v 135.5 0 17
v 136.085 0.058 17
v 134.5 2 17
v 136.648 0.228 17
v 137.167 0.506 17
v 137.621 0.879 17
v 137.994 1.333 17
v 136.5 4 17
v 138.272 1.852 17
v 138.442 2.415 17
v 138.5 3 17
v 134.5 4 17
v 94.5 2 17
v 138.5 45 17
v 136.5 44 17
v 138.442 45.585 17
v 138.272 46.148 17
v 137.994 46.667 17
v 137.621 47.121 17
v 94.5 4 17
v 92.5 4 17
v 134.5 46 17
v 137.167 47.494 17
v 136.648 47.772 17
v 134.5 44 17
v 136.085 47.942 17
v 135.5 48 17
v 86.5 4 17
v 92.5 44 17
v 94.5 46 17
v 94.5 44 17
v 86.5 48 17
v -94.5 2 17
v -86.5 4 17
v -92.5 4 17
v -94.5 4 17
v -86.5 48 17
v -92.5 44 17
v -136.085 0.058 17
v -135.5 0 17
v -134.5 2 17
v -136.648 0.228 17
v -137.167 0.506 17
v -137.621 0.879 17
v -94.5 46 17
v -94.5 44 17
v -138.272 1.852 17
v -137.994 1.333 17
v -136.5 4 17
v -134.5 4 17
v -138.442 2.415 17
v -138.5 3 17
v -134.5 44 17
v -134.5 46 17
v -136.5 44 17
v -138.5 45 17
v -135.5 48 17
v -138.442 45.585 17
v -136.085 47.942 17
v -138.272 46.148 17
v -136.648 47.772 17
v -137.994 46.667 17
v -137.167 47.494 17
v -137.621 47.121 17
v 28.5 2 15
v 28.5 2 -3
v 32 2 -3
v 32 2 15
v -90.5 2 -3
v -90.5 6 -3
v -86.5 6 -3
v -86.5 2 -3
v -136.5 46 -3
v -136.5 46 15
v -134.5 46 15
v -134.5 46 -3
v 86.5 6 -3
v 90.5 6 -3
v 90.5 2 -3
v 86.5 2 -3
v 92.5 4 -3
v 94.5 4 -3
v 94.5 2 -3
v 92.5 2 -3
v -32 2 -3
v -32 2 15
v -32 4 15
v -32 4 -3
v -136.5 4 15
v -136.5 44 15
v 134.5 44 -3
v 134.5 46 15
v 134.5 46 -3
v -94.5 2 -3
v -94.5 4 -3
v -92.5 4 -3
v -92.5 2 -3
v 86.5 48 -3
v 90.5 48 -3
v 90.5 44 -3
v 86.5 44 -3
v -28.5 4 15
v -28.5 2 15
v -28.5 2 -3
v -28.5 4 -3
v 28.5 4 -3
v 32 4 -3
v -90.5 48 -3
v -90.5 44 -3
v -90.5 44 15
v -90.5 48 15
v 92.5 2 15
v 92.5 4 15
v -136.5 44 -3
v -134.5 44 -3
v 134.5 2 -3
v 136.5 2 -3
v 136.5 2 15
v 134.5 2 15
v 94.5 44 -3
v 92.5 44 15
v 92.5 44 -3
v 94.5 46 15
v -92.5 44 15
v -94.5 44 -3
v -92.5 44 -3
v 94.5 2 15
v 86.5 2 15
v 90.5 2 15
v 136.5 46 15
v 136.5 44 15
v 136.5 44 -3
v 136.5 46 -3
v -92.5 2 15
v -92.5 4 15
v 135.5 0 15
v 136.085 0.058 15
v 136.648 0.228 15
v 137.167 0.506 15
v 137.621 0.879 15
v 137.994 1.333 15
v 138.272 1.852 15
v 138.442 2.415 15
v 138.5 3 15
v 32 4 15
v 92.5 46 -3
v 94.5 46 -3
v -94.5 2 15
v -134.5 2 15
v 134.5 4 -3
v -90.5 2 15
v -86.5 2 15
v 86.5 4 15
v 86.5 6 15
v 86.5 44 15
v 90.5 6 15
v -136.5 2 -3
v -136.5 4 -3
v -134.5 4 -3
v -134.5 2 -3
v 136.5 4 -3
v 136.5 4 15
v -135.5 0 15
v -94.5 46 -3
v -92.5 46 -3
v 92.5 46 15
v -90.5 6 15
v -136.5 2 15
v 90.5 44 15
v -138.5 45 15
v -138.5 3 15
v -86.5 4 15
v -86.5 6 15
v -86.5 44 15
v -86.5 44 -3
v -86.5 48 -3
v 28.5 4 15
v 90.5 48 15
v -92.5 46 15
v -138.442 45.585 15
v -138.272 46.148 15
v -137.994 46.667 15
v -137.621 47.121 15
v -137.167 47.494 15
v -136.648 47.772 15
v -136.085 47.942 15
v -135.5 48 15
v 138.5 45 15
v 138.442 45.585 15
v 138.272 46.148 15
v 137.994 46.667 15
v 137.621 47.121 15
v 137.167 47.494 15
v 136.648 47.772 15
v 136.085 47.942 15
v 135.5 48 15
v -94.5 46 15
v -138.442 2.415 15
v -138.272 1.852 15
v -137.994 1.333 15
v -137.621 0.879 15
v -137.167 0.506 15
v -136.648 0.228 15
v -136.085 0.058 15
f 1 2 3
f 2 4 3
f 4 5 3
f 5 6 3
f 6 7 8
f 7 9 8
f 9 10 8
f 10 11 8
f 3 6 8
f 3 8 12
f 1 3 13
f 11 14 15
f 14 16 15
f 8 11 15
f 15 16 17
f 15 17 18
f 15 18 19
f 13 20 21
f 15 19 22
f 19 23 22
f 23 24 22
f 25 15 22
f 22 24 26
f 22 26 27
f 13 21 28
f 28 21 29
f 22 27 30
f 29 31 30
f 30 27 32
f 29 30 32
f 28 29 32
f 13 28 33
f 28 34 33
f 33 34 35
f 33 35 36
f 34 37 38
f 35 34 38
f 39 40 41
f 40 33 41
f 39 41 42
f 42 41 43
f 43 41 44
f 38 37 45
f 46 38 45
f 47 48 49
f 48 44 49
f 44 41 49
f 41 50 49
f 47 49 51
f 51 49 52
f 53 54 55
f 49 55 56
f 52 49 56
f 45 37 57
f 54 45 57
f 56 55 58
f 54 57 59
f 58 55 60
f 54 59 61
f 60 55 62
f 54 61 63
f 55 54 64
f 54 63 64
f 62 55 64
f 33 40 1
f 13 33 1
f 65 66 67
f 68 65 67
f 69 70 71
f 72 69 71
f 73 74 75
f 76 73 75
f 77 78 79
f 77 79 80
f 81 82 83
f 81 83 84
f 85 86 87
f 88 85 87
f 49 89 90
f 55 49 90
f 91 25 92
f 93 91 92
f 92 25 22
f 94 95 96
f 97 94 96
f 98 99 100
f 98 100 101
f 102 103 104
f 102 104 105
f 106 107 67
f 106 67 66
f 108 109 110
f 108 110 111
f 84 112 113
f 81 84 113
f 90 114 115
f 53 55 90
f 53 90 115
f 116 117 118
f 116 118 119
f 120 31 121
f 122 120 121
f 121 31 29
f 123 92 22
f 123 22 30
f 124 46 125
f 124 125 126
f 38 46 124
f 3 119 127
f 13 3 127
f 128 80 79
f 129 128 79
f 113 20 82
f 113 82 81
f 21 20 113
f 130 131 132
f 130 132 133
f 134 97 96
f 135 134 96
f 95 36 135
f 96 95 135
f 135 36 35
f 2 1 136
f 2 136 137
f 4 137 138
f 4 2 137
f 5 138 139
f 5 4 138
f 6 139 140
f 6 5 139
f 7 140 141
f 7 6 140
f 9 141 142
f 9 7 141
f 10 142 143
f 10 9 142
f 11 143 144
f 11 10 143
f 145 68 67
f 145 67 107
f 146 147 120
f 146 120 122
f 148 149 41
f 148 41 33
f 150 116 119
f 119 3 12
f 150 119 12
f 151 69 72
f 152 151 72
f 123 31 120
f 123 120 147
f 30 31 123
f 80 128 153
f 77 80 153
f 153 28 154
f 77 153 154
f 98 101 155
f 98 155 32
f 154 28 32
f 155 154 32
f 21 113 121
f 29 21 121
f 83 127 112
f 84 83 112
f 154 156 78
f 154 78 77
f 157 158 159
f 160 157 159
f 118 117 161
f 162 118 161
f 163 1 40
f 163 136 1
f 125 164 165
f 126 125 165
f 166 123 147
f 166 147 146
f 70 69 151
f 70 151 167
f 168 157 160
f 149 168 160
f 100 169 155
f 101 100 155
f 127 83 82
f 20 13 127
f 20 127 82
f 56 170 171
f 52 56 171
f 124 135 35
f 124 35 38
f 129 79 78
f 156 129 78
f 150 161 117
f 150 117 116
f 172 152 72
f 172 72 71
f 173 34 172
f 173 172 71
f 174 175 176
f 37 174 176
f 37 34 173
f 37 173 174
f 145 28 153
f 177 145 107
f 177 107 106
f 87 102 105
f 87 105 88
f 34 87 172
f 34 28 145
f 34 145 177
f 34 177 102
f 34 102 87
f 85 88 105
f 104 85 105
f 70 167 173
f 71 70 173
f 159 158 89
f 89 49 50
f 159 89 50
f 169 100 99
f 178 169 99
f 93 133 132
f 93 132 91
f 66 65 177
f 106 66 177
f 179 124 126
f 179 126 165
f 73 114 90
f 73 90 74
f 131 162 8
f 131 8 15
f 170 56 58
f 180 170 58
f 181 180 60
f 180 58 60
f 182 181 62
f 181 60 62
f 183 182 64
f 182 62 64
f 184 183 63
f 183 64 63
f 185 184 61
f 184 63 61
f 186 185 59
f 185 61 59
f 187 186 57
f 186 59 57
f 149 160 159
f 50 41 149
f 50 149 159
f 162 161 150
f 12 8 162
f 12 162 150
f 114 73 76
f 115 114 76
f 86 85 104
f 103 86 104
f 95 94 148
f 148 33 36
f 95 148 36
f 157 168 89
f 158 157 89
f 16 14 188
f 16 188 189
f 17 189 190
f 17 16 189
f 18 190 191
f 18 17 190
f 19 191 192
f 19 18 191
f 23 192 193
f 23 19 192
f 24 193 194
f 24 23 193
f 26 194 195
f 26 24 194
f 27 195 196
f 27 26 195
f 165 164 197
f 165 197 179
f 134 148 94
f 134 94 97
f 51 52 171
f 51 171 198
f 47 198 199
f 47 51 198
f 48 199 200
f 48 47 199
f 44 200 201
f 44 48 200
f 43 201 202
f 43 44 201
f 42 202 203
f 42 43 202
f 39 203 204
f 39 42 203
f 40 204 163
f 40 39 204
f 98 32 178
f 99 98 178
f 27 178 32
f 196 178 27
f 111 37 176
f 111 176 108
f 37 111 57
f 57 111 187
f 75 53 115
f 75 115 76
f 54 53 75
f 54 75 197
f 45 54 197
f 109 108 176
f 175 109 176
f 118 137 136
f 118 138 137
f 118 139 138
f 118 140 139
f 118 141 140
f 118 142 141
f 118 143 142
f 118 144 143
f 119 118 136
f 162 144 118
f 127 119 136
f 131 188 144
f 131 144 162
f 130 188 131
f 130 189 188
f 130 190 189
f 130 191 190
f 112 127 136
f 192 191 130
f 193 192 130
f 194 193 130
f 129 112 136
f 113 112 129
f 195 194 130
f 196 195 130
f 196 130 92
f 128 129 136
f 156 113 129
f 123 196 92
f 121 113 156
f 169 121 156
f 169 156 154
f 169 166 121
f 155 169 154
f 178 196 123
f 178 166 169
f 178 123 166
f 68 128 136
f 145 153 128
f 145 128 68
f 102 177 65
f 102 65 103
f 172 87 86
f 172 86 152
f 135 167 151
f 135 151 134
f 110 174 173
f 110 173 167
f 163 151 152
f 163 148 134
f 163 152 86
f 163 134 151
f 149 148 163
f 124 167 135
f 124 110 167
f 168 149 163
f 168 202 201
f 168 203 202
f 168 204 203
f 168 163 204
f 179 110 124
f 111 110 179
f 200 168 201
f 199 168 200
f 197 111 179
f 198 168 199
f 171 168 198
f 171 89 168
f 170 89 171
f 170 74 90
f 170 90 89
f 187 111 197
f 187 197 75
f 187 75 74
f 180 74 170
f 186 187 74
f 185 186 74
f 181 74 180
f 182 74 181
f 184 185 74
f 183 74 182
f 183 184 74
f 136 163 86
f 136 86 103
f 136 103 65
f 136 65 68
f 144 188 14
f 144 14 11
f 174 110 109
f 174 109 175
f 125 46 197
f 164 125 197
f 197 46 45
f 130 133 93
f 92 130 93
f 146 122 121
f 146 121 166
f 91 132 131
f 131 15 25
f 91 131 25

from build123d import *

# Parameters (mm, degrees)
F0_W     = 44
F0_H     = 44
F1_DEPTH = 17
F2_W     = 2
F2_H     = 2
F2_W_2   = 4
F2_H_2   = 4
F2_W_3   = 3.5
F3_DEPTH = 20
F4_W     = 4
F4_H     = 38
F4_W_2   = 86.5
F4_H_2   = 2
F5_DEPTH = 2
F7_R     = 3
F8_R     = 3
F9_DEPTH = 15


with BuildPart() as f1:
    # F0 (on Top) → F1 (new body)
    with BuildSketch(Plane.XY):
        Polygon((-138.5, 0), (-90.5, 0), (0, 0), (0, 2), (-90.5, 2), (-90.5, 48), (-138.5, 48), align=None)
        with Locations((-114.5, 24)):
            Rectangle(F0_W, F0_H, mode=Mode.SUBTRACT)
    extrude(amount=F1_DEPTH)

    # F2 (on face) → F3 (join)
    with BuildSketch(Plane.XY.offset(17)):
        with Locations((-135.5, 3)):
            Rectangle(F2_W, F2_H)
        with Locations((-135.5, 45)):
            Rectangle(F2_W, F2_H)
        with Locations((-93.5, 3)):
            Rectangle(F2_W, F2_H)
        with Locations((-93.5, 45)):
            Rectangle(F2_W, F2_H)
        with Locations((-88.5, 46)):
            Rectangle(F2_W_2, F2_H_2)
        with Locations((-88.5, 4)):
            Rectangle(F2_W_2, F2_H_2)
        with Locations((-30.25, 3)):
            Rectangle(F2_W_3, F2_H)
    extrude(amount=-F3_DEPTH)

    # F4 (on face) → F5 (join)
    with BuildSketch(Plane.XY.offset(17)):
        with Locations((-88.5, 25)):
            Rectangle(F4_W, F4_H)
        with Locations((-43.25, 3)):
            Rectangle(F4_W_2, F4_H_2)
    extrude(amount=-F5_DEPTH)

    # F6: F1 across face


with BuildPart() as f1_1:
    add(f1.part)
    add(f1.part.mirror(Plane(origin=(0, 1.2105263158, 9.2894736842), x_dir=(0, 1, 0), z_dir=(1, 0, 0))))

    # F7
    f7_edges = [f1_1.edges().sort_by_distance(p)[0] for p in [
        (-138.5, 0, 8.5),
        (138.5, 0, 8.5),
    ]]
    fillet(f7_edges, radius=F7_R)

    # F8
    f8_edges = [f1_1.edges().sort_by_distance(p)[0] for p in [
        (-138.5, 48, 8.5),
        (138.5, 48, 8.5),
    ]]
    fillet(f8_edges, radius=F8_R)

    # F9 (cut): a face of the model
    f9_faces = [f1_1.faces().sort_by_distance(p)[0] for p in [
        (-138.2188719153, 24, 0),
    ]]
    extrude(f9_faces, amount=-F9_DEPTH, mode=Mode.SUBTRACT)


solid = f1_1.part
